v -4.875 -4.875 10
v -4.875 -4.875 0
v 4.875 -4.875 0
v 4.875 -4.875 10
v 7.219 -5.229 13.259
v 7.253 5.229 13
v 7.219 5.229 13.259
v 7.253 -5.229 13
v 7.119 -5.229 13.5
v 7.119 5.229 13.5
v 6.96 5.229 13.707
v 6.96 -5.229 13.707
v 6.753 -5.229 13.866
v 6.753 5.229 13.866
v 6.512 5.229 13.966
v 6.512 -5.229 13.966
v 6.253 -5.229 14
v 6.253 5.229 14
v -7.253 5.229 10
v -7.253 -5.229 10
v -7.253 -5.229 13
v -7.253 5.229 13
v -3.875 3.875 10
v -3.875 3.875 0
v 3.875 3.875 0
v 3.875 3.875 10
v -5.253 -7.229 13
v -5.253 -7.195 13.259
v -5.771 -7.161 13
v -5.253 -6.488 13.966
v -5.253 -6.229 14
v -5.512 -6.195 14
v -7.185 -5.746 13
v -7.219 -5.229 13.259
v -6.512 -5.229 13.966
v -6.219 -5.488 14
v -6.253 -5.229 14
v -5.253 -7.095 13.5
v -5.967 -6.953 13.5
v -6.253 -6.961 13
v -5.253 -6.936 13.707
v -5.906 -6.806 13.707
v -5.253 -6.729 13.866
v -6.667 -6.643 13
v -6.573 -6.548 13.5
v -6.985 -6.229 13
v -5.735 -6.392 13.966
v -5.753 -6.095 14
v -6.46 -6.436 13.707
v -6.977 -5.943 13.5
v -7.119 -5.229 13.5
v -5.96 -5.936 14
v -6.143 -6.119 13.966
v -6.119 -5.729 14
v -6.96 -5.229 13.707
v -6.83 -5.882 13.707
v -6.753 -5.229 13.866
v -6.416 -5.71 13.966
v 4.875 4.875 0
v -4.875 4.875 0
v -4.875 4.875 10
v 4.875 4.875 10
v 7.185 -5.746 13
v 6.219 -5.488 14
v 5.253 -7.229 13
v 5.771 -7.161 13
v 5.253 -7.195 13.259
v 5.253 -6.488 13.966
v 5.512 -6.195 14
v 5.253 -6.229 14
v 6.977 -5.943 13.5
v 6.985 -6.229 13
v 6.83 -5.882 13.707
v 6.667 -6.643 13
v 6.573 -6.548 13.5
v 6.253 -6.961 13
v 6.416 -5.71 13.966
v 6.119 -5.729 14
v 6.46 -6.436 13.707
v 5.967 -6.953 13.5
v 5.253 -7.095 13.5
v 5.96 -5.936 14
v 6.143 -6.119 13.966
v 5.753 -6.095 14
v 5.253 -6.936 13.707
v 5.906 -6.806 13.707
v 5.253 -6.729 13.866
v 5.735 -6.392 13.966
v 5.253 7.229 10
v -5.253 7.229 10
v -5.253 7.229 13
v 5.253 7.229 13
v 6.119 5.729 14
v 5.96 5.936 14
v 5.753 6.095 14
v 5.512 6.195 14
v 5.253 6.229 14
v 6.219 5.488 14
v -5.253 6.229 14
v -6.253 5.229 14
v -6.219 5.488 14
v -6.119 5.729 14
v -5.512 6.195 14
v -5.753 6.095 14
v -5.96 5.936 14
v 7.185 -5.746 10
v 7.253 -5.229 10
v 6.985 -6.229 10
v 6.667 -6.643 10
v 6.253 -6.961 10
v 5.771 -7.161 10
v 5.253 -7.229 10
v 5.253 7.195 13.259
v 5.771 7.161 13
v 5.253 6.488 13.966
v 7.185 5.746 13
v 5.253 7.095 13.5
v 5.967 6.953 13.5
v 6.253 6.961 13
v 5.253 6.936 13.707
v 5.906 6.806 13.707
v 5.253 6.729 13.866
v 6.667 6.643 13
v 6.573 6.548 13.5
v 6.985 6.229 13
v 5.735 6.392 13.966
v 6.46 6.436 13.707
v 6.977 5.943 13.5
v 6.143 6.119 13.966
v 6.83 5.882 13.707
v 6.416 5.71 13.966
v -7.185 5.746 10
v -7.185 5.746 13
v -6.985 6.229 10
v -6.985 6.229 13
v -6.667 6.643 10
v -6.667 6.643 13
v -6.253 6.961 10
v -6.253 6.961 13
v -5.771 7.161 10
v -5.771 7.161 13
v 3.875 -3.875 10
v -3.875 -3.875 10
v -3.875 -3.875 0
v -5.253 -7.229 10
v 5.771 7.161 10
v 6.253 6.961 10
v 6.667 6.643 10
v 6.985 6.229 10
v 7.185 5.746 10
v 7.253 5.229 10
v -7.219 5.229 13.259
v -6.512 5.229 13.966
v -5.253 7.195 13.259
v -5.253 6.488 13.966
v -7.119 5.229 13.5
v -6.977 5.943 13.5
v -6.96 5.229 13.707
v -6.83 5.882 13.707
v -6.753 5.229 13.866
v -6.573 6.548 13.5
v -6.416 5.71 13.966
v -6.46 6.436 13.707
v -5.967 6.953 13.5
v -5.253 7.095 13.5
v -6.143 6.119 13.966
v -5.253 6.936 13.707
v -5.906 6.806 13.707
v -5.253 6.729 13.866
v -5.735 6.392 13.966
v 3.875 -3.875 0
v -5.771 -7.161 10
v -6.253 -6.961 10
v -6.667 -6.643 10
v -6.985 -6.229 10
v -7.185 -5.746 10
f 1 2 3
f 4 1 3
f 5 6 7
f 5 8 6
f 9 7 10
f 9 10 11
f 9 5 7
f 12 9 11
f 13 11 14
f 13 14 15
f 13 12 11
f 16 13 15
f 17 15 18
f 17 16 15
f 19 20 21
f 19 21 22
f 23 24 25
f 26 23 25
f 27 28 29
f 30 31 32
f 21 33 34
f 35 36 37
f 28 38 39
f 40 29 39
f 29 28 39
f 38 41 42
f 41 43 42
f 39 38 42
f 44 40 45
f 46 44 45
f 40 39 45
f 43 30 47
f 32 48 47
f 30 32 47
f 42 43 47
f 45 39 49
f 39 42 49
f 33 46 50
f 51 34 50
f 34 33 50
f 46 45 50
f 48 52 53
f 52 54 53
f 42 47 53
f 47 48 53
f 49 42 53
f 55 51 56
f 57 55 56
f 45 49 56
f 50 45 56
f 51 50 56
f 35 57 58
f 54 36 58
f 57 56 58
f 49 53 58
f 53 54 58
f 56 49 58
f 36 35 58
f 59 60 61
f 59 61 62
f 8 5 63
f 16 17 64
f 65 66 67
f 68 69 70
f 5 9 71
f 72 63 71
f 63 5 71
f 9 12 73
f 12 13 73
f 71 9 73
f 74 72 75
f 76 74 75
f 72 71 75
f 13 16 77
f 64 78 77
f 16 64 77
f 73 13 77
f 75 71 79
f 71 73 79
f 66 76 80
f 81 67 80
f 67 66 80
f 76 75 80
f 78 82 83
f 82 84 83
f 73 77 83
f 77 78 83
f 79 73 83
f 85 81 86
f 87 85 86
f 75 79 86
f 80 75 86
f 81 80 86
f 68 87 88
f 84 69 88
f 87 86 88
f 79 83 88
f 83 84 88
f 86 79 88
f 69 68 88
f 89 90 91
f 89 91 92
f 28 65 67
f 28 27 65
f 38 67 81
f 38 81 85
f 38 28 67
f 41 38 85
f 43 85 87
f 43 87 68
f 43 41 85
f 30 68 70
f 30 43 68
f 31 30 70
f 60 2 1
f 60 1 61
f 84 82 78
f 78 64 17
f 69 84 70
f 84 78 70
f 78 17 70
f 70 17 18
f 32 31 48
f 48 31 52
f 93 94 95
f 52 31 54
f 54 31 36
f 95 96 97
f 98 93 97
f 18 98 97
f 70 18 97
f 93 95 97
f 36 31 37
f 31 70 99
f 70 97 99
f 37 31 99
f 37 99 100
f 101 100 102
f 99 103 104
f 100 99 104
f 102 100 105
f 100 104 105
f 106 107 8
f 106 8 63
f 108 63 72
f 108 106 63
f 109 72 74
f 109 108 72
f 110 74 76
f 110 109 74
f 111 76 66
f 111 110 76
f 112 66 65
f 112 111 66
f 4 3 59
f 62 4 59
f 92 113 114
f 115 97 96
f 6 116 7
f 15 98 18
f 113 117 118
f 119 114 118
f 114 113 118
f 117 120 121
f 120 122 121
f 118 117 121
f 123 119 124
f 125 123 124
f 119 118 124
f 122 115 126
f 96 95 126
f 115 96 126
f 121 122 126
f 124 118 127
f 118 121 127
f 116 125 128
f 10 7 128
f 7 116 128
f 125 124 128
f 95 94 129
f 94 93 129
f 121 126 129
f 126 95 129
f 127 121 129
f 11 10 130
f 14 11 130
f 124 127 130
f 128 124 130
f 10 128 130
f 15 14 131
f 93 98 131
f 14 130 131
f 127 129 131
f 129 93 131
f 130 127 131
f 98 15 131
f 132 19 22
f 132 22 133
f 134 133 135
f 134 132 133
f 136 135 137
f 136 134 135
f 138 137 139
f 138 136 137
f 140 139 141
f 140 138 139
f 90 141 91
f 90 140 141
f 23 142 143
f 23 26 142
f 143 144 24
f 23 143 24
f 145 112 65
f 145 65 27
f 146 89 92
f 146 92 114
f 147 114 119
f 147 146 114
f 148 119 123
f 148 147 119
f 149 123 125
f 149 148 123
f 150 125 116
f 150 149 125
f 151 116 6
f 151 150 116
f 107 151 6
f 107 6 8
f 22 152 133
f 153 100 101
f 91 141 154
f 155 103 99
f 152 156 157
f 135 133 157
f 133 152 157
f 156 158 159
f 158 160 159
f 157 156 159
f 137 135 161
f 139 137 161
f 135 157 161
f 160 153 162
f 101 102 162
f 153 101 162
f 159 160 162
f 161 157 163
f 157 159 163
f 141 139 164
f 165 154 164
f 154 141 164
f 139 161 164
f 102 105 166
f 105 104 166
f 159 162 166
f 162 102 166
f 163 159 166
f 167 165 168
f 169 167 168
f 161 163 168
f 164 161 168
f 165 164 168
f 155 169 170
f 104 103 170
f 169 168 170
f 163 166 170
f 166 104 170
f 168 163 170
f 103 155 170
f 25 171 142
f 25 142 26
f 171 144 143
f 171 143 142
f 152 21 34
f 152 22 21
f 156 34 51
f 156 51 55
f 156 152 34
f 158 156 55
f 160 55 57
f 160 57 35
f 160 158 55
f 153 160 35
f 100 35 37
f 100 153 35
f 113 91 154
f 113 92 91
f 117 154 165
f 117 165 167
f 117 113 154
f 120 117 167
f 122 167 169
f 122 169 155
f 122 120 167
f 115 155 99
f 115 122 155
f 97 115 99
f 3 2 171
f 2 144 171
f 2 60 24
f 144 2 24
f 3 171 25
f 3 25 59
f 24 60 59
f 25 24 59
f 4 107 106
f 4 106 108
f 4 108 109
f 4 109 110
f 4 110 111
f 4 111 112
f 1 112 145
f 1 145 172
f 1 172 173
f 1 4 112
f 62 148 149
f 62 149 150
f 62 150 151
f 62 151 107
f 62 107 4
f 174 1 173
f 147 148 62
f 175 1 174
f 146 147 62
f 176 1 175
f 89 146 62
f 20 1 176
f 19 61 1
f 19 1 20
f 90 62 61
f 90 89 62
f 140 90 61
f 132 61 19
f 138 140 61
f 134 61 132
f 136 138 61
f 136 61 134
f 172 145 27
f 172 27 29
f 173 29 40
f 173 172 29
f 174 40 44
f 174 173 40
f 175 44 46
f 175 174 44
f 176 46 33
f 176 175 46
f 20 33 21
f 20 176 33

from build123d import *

# Parameters (mm, degrees)
SKETCH1_W           = 9.75
SKETCH1_H           = 9.75
SKETCH1_W_2         = 7.75
SKETCH1_H_2         = 7.75
BOSS_EXTRUDE1_DEPTH = 10
BOSS_EXTRUDE2_DEPTH = 4
FILLET1_R           = 1


with BuildPart() as part:
    # Sketch1 → Boss-Extrude1 (new body)
    with BuildSketch(Plane.XY):
        Rectangle(SKETCH1_W, SKETCH1_H)
        Rectangle(SKETCH1_W_2, SKETCH1_H_2, mode=Mode.SUBTRACT)
    extrude(amount=BOSS_EXTRUDE1_DEPTH)

    # Sketch2 → Boss-Extrude2 (add)
    with BuildSketch(Plane.XY.offset(10)):
        with BuildLine():
            Line((-5.253161089, 7.228716278), (5.253161089, 7.228716278))
            ThreePointArc((5.253161089, 7.228716278), (6.667374652, 6.64292984), (7.253161089, 5.228716278))
            Line((7.253161089, 5.228716278), (7.253161089, -5.228716278))
            ThreePointArc((7.253161089, -5.228716278), (6.667374652, -6.64292984), (5.253161089, -7.228716278))
            Line((5.253161089, -7.228716278), (-5.253161089, -7.228716278))
            ThreePointArc((-5.253161089, -7.228716278), (-6.667374652, -6.64292984), (-7.253161089, -5.228716278))
            Line((-7.253161089, -5.228716278), (-7.253161089, 5.228716278))
            ThreePointArc((-7.253161089, 5.228716278), (-6.667374652, 6.64292984), (-5.253161089, 7.228716278))
        make_face()
    extrude(amount=BOSS_EXTRUDE2_DEPTH)

    # Fillet1
    fillet1_edges = [part.edges().sort_by_distance(p)[0] for p in [
        (6.667374652, 6.64292984, 14),
        (0, 7.228716278, 14),
        (-6.667374652, 6.64292984, 14),
        (-7.253161089, 0, 14),
        (-6.667374652, -6.64292984, 14),
        (0, -7.228716278, 14),
        (6.667374652, -6.64292984, 14),
        (7.253161089, 0, 14),
    ]]
    fillet(fillet1_edges, radius=FILLET1_R)


solid = part.part
